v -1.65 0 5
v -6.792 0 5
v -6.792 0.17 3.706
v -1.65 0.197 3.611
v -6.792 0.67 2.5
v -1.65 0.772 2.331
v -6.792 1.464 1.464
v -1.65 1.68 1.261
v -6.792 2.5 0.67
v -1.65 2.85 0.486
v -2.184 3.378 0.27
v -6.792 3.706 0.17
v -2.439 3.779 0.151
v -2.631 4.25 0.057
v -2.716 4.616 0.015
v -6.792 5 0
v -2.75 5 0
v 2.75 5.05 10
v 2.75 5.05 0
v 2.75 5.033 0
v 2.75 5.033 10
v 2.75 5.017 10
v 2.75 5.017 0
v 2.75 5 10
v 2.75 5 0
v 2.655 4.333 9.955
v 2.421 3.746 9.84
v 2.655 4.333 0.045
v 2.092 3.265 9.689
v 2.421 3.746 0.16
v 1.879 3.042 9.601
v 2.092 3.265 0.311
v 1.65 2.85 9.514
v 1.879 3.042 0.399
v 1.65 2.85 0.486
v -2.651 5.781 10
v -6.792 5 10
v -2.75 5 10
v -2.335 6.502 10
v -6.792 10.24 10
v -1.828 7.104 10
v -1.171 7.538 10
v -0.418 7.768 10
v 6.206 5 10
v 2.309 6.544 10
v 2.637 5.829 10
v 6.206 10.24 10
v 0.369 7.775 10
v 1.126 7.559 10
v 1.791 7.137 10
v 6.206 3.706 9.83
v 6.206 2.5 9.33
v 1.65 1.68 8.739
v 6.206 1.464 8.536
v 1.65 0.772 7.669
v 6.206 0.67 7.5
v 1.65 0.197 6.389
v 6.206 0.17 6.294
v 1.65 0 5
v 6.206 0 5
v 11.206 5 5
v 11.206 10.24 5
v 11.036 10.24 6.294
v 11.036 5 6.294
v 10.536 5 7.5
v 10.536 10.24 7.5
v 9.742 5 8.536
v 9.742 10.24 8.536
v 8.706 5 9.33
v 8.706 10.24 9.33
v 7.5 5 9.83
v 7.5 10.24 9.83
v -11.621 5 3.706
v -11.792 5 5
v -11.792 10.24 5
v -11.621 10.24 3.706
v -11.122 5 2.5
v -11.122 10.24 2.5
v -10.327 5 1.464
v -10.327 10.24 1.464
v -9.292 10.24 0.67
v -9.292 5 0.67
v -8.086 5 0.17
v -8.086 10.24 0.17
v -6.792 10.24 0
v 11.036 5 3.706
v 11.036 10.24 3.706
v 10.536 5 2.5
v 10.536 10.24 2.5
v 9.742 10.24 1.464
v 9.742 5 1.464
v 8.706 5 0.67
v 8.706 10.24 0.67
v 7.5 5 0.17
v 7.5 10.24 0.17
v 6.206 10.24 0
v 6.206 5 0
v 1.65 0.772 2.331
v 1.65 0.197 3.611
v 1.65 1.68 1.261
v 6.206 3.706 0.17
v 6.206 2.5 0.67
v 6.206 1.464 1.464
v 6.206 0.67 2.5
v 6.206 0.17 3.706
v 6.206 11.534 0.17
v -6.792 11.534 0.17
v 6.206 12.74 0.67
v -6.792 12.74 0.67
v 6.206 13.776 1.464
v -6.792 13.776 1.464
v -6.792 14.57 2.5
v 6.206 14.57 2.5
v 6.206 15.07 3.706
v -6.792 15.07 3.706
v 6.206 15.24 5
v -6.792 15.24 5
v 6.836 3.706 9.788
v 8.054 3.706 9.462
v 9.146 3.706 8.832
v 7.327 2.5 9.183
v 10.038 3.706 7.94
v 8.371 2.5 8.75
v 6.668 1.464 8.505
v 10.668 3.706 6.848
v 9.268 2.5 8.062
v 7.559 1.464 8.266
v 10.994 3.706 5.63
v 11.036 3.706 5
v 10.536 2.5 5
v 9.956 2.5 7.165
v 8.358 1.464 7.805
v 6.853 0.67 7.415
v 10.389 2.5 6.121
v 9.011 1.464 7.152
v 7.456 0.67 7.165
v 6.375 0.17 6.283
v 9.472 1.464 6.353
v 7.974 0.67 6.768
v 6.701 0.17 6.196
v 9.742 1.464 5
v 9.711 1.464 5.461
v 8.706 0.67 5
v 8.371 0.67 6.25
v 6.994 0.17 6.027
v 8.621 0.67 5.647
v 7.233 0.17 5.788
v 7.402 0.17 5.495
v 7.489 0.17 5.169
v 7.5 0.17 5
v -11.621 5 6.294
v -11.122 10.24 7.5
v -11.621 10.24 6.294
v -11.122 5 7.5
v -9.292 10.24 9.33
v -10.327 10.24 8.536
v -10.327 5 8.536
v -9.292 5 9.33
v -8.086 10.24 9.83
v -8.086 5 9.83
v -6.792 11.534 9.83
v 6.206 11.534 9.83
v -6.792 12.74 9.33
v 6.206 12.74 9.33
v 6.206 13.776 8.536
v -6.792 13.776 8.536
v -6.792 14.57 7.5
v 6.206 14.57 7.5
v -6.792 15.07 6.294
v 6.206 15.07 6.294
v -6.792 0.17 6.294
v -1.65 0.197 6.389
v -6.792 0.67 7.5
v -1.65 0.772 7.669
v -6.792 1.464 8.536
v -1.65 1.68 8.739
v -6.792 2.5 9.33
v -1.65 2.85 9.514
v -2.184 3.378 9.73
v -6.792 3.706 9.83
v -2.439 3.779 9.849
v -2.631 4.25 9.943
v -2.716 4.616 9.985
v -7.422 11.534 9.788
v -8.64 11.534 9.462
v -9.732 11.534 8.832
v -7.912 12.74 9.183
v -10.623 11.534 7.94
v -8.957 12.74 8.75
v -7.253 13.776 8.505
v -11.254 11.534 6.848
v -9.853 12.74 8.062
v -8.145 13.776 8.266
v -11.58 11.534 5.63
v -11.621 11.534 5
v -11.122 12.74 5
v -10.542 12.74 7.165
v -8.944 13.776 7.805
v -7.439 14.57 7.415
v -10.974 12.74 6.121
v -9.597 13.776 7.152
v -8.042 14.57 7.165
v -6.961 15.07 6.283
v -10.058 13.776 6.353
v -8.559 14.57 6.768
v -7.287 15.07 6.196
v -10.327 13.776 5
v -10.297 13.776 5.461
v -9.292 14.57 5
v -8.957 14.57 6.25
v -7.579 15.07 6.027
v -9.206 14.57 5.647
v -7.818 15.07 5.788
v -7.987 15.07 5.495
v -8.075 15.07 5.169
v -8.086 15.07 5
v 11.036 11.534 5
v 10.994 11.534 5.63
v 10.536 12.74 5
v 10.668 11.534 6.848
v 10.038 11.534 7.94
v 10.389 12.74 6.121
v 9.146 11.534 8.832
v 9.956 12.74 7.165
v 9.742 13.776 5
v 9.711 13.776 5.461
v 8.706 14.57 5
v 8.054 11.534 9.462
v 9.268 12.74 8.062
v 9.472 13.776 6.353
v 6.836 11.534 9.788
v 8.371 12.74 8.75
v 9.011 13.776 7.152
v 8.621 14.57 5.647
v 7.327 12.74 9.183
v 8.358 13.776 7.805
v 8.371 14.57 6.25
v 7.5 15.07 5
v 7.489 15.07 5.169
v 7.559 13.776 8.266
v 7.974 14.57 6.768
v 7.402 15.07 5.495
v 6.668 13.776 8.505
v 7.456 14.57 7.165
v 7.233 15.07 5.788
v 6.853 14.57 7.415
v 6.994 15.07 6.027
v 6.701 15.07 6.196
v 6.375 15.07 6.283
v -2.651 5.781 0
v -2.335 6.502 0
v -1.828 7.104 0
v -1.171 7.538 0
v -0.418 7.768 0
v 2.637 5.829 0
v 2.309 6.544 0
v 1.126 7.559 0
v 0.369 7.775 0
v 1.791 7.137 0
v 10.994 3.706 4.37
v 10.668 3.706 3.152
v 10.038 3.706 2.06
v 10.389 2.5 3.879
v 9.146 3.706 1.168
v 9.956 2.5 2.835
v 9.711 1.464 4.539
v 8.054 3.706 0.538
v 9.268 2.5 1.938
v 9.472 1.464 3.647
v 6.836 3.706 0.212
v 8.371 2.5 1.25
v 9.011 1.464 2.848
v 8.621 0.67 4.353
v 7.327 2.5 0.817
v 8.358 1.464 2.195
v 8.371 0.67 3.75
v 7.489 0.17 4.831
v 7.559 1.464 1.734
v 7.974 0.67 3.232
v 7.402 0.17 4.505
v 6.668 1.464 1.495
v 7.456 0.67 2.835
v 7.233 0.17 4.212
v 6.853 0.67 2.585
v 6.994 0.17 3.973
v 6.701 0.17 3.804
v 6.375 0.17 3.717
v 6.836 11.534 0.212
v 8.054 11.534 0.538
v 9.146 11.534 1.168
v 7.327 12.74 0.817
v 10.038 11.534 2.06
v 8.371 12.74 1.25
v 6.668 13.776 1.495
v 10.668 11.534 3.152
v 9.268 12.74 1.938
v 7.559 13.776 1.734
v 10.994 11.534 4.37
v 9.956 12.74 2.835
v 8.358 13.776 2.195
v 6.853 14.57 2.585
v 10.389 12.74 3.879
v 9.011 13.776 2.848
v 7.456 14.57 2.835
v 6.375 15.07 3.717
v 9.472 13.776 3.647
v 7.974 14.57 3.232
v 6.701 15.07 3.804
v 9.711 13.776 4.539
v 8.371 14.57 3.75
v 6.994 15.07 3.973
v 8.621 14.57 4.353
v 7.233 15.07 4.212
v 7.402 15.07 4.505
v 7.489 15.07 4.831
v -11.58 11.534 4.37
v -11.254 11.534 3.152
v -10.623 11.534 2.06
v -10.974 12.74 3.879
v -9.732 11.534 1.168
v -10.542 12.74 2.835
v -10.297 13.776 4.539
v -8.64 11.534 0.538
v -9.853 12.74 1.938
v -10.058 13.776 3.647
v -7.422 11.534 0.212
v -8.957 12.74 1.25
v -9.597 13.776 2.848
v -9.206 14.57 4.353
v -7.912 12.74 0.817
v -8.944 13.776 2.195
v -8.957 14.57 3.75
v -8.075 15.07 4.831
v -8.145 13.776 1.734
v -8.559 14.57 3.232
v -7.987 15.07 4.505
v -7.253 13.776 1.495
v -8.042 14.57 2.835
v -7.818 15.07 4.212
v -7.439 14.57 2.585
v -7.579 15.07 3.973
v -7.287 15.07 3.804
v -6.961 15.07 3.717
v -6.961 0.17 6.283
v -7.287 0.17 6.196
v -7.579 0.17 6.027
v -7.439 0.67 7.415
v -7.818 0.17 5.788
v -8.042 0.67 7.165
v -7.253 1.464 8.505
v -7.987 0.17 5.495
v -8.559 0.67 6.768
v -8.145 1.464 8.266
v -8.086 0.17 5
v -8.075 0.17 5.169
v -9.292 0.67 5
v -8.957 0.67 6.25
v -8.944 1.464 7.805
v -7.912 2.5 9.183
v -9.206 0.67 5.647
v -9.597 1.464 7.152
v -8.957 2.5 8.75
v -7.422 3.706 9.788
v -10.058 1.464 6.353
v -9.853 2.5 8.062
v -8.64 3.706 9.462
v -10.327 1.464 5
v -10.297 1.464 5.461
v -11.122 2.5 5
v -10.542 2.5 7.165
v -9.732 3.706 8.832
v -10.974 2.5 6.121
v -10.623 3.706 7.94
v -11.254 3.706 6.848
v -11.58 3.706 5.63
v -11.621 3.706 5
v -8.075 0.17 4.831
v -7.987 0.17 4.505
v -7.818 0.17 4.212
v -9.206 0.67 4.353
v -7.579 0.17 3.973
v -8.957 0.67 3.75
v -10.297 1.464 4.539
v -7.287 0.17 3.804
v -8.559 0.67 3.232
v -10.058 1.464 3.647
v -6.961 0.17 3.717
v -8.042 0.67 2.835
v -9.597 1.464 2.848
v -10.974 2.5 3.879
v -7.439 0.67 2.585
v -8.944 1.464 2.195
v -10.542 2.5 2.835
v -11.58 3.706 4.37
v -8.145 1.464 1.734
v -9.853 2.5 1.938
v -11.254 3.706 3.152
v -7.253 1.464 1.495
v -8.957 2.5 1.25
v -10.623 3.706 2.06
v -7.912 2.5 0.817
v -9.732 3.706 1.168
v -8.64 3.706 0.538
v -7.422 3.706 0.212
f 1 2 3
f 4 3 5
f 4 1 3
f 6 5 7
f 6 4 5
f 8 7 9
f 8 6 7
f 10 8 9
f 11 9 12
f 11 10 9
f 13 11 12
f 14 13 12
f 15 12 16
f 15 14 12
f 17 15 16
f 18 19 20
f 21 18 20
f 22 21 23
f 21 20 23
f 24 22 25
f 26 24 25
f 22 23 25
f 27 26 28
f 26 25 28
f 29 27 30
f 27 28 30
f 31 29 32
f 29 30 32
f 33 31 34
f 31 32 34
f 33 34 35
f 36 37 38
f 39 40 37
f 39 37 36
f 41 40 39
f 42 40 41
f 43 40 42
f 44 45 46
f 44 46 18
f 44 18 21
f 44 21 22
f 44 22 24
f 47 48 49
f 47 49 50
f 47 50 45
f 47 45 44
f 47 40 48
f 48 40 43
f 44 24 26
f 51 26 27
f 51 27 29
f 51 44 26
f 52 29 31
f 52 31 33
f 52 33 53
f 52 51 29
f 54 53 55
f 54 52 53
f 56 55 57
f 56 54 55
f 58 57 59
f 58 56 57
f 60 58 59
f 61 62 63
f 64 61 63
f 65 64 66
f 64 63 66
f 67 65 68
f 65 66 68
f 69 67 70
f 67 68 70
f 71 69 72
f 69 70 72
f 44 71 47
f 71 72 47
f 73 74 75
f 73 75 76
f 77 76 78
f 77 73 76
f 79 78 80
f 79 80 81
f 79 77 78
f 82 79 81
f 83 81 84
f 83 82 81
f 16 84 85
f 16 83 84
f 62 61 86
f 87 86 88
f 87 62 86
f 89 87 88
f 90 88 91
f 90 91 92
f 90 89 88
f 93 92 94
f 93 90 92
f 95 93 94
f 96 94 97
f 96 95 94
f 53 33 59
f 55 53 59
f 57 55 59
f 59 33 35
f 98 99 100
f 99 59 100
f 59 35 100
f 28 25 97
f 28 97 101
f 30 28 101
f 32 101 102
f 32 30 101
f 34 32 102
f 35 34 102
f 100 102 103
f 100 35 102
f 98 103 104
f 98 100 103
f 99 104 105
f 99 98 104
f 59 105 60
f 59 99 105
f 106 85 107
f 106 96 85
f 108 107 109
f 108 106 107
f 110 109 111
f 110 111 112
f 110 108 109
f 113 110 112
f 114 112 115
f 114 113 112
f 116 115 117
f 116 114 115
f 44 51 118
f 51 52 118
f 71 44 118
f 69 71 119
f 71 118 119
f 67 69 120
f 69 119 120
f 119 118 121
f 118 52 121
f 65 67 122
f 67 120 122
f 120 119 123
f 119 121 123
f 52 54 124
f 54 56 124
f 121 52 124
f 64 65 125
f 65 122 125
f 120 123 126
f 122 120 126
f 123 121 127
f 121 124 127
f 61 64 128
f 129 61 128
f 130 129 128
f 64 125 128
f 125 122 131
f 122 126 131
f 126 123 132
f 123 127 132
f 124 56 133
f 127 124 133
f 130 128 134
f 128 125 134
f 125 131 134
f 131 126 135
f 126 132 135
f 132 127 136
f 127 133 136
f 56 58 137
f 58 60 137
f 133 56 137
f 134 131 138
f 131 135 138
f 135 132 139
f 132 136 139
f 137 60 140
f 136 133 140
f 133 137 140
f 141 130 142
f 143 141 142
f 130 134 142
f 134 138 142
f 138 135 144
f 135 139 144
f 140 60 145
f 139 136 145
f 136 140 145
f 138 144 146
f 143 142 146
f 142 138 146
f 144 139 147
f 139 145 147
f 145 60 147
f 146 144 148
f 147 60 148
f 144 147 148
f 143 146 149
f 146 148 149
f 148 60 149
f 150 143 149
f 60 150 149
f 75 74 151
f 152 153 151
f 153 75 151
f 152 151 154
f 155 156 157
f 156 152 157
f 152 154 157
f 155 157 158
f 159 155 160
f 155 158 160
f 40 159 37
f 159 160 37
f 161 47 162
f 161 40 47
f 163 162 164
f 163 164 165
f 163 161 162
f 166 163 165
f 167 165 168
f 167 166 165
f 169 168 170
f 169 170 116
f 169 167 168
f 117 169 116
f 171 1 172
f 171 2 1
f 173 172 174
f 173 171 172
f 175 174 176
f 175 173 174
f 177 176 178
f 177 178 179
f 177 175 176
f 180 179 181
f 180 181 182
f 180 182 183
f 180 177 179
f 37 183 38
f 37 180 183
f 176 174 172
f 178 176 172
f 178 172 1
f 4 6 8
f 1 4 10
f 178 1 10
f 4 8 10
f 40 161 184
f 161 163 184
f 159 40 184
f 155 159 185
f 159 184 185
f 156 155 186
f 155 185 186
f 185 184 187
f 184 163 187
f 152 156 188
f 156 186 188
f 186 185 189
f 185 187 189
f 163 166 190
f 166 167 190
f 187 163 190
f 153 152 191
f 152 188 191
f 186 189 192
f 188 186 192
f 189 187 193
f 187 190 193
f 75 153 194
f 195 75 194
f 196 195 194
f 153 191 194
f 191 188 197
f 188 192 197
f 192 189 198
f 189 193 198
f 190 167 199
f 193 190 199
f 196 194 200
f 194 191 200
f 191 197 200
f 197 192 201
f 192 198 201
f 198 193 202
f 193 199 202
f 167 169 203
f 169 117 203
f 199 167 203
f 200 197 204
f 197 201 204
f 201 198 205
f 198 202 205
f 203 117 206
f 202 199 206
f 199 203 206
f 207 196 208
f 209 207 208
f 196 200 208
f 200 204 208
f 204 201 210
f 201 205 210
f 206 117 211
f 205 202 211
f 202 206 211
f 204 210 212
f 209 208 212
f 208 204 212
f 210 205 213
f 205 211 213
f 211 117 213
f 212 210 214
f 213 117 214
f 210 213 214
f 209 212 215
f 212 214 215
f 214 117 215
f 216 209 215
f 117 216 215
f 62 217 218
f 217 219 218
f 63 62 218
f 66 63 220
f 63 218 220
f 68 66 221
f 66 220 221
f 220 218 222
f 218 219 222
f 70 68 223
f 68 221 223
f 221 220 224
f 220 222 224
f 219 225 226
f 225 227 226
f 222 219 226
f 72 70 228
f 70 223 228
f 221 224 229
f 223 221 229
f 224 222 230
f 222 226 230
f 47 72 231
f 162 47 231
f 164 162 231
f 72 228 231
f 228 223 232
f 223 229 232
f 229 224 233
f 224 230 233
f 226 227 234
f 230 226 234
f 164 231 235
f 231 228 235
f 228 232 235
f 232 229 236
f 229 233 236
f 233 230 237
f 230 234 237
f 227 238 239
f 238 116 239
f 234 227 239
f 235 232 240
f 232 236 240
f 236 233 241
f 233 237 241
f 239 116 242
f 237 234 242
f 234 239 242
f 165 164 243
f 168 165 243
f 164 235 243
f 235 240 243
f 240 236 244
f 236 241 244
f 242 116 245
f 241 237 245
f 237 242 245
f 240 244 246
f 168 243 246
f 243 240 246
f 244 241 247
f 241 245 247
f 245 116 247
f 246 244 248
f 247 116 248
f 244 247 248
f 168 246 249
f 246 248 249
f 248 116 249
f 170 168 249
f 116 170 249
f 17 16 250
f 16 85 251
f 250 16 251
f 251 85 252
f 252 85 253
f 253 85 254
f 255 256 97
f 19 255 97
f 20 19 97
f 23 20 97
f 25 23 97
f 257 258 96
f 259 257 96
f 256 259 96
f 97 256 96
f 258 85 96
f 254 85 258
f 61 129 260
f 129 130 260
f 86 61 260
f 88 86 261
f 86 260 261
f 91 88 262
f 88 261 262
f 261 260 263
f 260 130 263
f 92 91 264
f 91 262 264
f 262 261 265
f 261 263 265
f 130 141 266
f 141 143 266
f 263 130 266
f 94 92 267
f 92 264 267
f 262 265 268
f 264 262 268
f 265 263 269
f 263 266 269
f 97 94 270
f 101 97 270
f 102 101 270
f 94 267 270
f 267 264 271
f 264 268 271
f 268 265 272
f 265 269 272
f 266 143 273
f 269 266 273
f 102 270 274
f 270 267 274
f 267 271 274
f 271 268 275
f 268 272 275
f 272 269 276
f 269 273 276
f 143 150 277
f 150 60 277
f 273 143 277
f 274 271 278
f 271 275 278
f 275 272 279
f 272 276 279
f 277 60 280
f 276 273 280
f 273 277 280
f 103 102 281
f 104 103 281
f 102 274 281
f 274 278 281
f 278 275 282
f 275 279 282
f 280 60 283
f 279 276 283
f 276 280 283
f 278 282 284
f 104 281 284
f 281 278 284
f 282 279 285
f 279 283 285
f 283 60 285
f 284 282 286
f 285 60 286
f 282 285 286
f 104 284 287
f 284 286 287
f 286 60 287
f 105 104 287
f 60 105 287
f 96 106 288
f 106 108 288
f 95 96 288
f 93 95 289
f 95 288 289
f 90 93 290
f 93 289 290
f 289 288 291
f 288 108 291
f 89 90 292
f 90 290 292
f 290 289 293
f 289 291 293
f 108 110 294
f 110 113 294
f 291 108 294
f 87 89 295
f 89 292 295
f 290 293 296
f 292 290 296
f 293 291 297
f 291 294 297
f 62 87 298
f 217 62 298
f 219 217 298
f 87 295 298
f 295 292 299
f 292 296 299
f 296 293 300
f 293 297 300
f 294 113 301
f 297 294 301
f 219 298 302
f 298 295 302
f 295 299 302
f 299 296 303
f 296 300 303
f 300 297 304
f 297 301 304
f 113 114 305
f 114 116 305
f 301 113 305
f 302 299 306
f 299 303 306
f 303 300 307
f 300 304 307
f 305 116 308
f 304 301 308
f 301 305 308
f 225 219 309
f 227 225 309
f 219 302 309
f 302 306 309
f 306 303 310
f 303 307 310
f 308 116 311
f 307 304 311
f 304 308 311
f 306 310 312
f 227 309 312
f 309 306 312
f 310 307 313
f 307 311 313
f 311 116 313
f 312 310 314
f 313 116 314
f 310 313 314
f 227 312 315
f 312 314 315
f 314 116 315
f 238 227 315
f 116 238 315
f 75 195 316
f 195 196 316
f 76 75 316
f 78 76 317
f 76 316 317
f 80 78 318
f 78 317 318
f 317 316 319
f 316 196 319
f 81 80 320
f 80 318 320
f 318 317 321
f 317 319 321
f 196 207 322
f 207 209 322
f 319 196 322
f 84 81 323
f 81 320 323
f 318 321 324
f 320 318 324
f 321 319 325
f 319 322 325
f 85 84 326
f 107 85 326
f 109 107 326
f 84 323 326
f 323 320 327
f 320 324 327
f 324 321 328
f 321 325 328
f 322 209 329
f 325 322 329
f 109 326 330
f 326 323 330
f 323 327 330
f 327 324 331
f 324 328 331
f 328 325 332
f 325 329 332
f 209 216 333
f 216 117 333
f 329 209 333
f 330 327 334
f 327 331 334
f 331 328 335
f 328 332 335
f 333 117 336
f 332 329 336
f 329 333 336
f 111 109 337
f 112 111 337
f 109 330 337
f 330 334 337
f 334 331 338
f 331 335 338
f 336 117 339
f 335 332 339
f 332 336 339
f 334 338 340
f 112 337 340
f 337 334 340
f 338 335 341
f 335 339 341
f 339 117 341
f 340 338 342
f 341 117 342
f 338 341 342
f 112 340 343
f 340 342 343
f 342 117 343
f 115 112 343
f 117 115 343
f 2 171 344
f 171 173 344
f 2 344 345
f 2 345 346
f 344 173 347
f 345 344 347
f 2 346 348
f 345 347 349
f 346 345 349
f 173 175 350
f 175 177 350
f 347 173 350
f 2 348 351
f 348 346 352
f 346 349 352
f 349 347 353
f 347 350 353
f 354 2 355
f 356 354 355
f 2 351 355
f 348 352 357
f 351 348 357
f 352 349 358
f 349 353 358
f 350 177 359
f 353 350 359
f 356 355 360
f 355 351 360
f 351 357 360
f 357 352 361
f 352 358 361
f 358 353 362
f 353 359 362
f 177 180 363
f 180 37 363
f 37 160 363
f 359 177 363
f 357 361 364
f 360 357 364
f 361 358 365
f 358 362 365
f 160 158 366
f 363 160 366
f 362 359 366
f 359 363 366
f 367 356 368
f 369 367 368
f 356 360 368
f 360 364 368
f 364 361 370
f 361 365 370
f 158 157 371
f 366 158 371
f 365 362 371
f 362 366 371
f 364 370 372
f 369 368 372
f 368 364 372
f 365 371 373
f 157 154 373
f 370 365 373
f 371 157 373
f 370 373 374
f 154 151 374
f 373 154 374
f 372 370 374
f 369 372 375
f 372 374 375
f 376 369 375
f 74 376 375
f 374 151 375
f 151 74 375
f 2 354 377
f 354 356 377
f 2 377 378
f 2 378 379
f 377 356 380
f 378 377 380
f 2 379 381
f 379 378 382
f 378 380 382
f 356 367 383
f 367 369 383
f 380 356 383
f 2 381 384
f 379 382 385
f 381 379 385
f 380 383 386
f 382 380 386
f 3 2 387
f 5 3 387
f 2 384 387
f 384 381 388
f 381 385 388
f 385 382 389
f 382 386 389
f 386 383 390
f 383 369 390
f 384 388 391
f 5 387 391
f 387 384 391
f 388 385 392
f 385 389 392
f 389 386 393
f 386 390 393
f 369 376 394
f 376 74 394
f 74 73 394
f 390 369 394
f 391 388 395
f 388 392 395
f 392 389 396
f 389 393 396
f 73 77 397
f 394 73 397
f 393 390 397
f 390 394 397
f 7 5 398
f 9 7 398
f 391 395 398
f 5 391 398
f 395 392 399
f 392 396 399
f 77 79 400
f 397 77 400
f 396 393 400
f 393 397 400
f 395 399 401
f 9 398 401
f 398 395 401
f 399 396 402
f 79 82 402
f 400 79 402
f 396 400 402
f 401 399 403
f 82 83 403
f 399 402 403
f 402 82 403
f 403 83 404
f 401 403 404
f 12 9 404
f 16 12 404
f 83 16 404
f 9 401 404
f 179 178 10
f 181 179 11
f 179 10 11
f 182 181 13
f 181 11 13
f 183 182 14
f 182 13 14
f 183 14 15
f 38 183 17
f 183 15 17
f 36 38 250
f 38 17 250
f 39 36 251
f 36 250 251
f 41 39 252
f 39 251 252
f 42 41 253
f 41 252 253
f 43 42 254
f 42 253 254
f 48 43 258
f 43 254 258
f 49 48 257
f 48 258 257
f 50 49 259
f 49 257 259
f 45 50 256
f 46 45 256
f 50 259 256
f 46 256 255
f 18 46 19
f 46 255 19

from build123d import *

# Parameters (mm, degrees)
F1_DEPTH = 10
F2_R     = 4.99999
F3_R     = 4.99999


# Not quite as in the source:
# - a fillet or chamfer is up to 0.001 mm smaller than in the source, because OpenCascade refuses the exact size


with BuildPart() as f1:
    # F0 (on Top) → F1 (new body)
    with BuildSketch(Plane.XY):
        with BuildLine():
            Line((-11.7916028897, 0), (-1.65, 0))
            Line((-1.65, 0), (-1.65, 2.85))
            ThreePointArc((-1.65, 2.85), (-1.2298373876, 7.5096747752), (2.75, 5.05))
            ThreePointArc((2.75, 5.05), (2.4596747752, 3.8201626124), (1.65, 2.85))
            Line((1.65, 2.85), (1.65, 0))
            Line((1.65, 0), (11.2060164511, 0))
            Line((11.2060164511, 0), (11.2060164511, 15.24))
            Line((11.2060164511, 15.24), (-11.7916028897, 15.24))
            Line((-11.7916028897, 15.24), (-11.7916028897, 0))
        make_face()
    extrude(amount=F1_DEPTH)

    # F2 (radius 5 in the source; OpenCascade refuses exactly that, so slightly less here)
    f2_edges = [f1.edges().sort_by_distance(p)[0] for p in [
        (11.206016, 7.62, 10),
        (11.206016, 7.62, 0),
        (-11.791603, 7.62, 0),
        (-11.791603, 7.62, 10),
    ]]
    fillet(f2_edges, radius=F2_R)

    # F3 (radius 5 in the source; OpenCascade refuses exactly that, so slightly less here)
    f3_edges = [f1.edges().sort_by_distance(p)[0] for p in [
        (-0.292793, 15.24, 10),
        (-10.32714, 0, 1.464463),
        (9.741553, 0, 1.464463),
    ]]
    fillet(f3_edges, radius=F3_R)


solid = f1.part
